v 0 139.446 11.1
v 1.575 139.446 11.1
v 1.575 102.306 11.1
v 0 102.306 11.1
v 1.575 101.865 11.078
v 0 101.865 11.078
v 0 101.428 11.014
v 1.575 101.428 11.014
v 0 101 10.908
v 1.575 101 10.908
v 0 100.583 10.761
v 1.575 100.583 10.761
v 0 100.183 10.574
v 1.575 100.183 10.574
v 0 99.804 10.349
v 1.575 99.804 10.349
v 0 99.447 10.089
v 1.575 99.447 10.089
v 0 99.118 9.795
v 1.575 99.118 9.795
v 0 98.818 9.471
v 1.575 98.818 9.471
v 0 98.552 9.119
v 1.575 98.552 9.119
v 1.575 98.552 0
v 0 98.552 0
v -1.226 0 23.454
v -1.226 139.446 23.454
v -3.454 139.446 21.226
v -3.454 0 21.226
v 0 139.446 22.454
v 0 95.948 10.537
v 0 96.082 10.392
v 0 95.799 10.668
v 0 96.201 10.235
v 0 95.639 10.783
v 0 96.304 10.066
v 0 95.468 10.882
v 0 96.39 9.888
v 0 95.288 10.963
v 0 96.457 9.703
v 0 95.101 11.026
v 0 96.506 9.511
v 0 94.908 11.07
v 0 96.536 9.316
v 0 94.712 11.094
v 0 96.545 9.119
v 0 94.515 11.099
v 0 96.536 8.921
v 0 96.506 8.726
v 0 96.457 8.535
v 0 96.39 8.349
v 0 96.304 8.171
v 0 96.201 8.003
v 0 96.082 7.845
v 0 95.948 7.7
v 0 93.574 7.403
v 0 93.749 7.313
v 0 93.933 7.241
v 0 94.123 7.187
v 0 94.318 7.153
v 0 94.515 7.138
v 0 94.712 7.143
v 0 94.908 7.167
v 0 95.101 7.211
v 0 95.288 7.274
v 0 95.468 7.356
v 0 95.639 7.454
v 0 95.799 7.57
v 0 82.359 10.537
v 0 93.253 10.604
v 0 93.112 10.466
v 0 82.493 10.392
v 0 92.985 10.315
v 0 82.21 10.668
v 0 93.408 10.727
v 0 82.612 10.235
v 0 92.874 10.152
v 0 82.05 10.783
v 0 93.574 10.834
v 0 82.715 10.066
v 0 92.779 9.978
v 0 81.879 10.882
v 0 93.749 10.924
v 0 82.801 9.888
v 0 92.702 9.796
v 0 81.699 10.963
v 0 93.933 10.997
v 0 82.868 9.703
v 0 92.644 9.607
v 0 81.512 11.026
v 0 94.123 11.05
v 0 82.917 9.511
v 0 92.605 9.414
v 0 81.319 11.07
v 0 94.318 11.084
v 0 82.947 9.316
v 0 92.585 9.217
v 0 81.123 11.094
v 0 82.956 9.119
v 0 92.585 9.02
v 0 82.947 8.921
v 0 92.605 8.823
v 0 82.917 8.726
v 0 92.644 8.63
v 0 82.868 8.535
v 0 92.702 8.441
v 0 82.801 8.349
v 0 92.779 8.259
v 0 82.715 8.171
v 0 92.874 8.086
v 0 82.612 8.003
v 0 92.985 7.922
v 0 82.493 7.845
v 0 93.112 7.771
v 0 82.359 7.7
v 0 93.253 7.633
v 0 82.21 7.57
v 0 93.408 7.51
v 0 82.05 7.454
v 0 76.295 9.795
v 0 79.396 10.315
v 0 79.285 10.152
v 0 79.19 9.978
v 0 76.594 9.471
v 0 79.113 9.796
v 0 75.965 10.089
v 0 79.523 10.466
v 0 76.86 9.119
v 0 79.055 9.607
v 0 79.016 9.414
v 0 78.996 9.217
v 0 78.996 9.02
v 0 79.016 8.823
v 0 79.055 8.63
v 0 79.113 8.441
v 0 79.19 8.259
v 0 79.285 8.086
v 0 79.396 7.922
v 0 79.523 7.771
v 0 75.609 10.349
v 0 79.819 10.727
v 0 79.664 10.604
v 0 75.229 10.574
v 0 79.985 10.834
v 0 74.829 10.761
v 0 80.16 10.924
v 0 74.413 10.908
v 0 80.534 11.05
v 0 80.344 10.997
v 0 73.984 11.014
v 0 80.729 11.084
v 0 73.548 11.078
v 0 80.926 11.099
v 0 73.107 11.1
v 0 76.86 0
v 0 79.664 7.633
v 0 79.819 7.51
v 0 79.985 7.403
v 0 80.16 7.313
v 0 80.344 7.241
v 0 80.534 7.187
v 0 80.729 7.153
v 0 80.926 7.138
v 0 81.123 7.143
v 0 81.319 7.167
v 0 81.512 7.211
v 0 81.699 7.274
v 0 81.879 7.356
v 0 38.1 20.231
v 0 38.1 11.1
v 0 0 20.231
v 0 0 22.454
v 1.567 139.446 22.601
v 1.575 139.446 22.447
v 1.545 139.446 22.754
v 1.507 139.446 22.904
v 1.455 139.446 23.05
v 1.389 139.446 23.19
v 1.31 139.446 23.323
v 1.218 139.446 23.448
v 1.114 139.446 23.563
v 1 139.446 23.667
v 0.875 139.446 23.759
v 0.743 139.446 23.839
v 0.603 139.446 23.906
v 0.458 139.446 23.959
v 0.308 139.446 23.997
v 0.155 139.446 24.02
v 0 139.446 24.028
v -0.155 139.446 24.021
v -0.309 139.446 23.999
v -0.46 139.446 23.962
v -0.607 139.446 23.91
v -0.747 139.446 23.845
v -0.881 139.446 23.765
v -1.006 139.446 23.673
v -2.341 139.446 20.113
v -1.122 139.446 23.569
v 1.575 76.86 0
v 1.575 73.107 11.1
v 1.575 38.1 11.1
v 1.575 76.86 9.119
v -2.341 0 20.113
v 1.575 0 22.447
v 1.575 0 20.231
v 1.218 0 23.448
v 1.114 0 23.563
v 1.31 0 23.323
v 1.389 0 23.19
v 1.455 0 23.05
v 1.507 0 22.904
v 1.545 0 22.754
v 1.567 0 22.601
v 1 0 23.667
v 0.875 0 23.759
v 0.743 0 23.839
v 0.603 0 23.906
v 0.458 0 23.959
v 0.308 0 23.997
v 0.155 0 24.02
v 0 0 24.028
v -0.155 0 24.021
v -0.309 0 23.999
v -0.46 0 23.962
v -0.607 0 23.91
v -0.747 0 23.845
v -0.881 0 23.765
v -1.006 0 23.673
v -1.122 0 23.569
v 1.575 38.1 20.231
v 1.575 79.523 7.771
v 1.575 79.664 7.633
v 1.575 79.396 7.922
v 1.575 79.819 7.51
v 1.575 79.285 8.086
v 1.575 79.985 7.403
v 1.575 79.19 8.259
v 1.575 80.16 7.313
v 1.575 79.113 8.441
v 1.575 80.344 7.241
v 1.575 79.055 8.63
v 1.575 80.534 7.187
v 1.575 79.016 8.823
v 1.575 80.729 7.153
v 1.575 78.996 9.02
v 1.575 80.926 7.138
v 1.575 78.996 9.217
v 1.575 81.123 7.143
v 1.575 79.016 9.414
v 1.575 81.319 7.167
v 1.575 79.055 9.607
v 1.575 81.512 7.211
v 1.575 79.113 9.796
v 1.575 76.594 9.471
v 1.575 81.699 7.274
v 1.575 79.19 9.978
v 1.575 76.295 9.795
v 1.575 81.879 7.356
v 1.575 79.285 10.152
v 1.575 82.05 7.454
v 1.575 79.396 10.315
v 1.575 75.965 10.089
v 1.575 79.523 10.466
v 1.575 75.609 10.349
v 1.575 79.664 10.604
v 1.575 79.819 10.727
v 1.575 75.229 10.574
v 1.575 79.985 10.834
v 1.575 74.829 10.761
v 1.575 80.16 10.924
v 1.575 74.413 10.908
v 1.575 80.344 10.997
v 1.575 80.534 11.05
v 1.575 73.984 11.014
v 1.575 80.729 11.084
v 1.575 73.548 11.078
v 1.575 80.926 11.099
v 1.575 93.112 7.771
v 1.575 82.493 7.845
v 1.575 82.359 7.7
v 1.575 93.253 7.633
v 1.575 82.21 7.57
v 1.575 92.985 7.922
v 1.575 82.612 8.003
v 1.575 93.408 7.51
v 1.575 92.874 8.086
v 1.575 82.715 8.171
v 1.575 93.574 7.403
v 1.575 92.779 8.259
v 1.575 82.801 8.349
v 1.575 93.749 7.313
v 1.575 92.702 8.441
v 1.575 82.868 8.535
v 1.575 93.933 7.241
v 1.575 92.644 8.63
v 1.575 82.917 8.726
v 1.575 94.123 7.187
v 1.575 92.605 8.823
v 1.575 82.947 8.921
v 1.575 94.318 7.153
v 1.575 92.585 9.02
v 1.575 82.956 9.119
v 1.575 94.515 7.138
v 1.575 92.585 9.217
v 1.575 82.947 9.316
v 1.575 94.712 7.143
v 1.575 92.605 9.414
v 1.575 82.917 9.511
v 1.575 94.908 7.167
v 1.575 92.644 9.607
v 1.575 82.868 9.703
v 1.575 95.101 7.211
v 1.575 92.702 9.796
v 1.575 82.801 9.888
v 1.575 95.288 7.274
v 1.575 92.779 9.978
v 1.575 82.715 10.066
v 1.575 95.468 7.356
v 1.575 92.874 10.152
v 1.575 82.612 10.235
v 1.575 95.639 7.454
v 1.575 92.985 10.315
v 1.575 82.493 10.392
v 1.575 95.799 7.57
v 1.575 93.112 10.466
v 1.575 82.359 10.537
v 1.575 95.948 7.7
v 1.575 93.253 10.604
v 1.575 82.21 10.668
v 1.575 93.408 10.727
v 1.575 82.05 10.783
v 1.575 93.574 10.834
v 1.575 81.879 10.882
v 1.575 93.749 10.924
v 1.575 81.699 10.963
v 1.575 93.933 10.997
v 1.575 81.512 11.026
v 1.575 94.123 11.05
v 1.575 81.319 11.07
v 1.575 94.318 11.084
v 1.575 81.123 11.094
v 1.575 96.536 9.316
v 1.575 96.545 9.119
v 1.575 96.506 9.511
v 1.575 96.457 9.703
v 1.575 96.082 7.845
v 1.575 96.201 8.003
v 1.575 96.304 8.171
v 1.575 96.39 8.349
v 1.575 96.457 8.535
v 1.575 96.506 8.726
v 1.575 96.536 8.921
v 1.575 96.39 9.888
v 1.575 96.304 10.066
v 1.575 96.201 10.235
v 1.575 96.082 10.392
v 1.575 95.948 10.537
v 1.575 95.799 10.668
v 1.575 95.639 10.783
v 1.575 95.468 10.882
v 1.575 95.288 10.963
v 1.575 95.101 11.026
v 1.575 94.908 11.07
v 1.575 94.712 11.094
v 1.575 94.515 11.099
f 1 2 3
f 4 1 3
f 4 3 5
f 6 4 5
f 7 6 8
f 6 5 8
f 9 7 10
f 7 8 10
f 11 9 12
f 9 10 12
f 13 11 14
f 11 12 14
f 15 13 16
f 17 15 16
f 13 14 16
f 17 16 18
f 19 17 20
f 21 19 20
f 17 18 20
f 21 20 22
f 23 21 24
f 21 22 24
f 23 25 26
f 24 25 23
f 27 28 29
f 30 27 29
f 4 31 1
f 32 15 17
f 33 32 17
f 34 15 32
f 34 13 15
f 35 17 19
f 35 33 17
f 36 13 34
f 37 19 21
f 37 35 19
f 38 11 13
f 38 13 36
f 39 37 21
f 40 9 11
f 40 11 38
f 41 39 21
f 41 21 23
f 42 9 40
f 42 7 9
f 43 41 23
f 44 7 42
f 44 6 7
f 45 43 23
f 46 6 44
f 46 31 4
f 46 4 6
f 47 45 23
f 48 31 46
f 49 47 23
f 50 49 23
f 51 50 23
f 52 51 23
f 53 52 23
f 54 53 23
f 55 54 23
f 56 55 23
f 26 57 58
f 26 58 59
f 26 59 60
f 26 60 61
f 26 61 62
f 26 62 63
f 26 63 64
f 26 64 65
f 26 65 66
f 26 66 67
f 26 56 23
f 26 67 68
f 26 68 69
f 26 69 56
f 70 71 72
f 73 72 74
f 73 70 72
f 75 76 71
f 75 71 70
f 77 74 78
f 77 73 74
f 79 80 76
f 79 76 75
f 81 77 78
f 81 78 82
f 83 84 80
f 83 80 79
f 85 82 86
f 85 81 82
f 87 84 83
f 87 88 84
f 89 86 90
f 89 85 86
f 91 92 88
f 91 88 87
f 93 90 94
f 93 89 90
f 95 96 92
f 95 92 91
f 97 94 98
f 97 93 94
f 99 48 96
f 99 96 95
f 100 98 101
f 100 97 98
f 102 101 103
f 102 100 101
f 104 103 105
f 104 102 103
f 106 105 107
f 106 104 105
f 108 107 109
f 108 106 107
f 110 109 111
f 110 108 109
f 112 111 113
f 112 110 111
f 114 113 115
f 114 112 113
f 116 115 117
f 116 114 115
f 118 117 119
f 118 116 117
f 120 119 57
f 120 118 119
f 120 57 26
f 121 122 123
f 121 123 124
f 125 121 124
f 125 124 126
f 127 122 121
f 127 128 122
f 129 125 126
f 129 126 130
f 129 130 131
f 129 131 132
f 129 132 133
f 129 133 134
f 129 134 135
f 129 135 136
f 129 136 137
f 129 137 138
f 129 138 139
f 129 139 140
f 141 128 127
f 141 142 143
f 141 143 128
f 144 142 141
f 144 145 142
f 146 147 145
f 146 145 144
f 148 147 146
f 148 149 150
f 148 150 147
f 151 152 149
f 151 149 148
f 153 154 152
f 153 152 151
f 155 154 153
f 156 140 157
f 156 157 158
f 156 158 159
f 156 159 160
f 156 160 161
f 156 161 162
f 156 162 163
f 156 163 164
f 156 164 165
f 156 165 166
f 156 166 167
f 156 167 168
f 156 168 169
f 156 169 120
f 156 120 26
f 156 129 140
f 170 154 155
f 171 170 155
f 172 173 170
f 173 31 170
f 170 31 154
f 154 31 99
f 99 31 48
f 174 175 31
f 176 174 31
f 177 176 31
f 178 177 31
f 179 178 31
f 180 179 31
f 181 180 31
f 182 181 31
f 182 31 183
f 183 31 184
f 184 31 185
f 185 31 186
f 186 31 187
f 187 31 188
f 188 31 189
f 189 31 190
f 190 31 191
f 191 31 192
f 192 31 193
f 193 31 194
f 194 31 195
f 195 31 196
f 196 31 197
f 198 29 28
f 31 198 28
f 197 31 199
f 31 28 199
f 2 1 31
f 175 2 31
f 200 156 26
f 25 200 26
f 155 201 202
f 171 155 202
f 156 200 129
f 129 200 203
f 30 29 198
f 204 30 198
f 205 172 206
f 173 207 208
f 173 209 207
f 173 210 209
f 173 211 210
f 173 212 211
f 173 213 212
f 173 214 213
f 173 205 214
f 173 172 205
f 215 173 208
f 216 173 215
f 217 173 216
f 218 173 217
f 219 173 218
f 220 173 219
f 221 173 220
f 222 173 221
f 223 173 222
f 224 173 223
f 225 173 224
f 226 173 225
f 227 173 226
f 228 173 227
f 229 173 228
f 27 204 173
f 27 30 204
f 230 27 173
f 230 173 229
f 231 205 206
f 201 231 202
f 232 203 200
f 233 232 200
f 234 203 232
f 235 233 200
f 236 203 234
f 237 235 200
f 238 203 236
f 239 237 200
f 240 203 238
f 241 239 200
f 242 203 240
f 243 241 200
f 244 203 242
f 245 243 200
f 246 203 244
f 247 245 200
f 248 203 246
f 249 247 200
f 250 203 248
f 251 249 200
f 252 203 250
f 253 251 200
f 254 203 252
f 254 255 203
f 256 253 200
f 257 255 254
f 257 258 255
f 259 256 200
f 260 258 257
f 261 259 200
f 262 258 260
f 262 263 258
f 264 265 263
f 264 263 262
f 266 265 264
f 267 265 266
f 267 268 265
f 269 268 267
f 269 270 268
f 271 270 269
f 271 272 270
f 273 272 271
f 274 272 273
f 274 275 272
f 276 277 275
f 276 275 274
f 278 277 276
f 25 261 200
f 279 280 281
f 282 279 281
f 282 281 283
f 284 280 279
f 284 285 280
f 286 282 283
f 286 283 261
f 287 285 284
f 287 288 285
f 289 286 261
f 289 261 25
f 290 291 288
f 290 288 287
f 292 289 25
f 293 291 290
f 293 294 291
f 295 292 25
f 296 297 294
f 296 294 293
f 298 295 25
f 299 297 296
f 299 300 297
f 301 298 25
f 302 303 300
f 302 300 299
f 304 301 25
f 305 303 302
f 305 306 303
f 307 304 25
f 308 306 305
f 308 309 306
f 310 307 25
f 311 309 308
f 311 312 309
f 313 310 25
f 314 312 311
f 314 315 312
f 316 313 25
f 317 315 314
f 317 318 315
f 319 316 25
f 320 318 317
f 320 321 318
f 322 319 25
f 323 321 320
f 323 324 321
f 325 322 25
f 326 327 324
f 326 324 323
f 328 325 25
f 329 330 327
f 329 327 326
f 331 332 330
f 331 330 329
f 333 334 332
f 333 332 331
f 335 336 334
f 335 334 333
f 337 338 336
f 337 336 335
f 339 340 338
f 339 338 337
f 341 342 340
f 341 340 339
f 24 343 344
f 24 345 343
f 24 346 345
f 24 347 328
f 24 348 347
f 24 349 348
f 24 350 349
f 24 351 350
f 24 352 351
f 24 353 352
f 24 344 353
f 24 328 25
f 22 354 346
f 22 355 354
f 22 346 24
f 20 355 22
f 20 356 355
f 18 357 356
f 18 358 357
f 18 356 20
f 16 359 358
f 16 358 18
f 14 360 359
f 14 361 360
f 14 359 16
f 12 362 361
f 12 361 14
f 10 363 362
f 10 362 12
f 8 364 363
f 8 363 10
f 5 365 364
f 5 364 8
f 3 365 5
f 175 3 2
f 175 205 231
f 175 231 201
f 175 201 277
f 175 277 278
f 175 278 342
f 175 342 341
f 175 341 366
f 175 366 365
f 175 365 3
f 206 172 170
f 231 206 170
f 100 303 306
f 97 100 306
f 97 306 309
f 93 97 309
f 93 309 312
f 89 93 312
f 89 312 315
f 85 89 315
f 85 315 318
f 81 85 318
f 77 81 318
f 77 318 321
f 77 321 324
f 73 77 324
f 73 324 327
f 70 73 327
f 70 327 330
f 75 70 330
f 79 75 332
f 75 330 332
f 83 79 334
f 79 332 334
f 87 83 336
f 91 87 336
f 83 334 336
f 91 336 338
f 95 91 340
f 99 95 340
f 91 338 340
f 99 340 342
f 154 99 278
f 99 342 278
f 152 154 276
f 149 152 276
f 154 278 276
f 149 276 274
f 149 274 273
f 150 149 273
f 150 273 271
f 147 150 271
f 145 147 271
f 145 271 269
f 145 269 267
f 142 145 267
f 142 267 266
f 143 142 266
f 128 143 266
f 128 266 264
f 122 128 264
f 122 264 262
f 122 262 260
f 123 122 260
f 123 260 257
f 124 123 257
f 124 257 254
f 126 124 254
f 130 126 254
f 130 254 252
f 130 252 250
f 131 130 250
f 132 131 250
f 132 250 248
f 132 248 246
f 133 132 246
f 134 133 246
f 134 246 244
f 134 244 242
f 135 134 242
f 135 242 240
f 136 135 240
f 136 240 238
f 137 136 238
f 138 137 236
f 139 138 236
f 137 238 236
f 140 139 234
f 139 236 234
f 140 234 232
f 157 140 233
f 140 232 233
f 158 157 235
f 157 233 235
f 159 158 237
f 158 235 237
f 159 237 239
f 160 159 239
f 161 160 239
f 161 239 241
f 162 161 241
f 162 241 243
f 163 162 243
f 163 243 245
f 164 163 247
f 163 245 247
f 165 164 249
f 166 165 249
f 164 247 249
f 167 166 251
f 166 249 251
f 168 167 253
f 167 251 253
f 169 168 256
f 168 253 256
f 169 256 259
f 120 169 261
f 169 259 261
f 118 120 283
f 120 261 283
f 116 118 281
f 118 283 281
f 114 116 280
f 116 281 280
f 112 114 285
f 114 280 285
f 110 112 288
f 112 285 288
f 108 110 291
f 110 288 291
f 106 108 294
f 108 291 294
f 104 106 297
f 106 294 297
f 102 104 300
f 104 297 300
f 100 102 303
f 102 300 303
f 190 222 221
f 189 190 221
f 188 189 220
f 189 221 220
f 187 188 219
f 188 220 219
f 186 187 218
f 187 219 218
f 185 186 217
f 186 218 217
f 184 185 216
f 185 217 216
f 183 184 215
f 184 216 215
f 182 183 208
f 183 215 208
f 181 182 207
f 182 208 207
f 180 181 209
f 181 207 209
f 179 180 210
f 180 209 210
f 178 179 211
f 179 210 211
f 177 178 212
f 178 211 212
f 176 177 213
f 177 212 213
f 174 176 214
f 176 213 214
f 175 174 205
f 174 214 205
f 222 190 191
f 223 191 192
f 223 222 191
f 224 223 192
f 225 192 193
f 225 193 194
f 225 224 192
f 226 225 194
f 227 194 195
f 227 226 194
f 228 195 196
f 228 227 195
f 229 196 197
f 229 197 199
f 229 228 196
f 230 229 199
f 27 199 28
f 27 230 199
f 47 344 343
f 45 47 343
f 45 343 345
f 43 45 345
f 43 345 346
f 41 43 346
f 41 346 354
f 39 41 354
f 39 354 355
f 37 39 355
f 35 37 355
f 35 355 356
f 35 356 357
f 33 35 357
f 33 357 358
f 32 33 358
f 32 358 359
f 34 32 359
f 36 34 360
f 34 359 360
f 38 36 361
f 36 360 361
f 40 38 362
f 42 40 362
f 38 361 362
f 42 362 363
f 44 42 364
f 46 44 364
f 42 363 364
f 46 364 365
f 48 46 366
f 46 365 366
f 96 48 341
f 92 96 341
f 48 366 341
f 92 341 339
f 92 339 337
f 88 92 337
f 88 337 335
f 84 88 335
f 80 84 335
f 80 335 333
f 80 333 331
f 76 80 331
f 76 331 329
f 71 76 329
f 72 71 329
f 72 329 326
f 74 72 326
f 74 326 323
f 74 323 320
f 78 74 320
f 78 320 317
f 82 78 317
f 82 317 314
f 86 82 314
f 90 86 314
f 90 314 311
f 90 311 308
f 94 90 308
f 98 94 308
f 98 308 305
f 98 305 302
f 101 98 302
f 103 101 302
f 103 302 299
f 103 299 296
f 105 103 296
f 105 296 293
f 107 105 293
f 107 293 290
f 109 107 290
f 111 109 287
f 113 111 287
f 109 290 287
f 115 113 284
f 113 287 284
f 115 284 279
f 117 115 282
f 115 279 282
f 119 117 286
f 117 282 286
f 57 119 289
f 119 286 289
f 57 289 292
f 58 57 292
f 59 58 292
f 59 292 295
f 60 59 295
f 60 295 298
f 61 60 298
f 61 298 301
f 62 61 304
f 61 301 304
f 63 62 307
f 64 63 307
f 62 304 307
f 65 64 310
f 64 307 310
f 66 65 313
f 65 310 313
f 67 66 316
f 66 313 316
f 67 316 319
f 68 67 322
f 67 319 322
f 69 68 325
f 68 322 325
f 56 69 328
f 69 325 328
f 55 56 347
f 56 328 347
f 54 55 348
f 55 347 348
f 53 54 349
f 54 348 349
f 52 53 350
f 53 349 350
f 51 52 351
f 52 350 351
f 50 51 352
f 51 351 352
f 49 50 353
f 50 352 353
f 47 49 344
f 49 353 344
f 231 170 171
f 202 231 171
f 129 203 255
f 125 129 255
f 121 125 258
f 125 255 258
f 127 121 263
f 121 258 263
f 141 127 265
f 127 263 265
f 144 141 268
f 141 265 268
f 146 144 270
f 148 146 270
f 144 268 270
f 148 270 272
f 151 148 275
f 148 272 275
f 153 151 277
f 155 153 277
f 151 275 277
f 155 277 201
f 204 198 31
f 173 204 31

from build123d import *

# Parameters (mm, degrees)
F0_W      = 139.446
F0_H      = 24.0284
F1_DEPTH  = 1.5748
F2_R      = 2.5273
F2_R_2    = 1.9812
F3_DEPTH  = 25.4
F4_W      = 76.8604
F4_H      = 9.1186
F4_W_2    = 40.894
F5_DEPTH  = 25.4
F7_DEPTH  = 25.4
F9_DEPTH  = 139.447
F10_DEPTH = 139.446
F11_R     = 2.5273
F12_DEPTH = 25.4
F14_DEPTH = 1.5748
F15_DEPTH = 25.4


# Not quite as in the source:
# - ends of sketch curves that miss each other by under 0.0002 mm in the source are joined


with BuildPart() as f1:
    # F0 (on Right) → F1 (new body)
    with BuildSketch(Plane.YZ):
        with Locations((69.723, 12.0142)):
            Rectangle(F0_W, F0_H)
    extrude(amount=F1_DEPTH)

    # F2 (on face) → F3 (cut)
    with BuildSketch(Plane.YZ.offset(1.5748)):
        with Locations((7.9502, 14.6812)):
            Circle(F2_R)
        with Locations((80.9752, 9.1186)):
            Circle(F2_R_2)
        with Locations((94.5642, 9.1186)):
            Circle(F2_R_2)
    extrude(amount=-F3_DEPTH, mode=Mode.SUBTRACT)

    # F4 (on face) → F5 (cut)
    with BuildSketch(Plane.YZ.offset(1.5748)):
        with Locations((38.4302, 4.5593)):
            Rectangle(F4_W, F4_H)
        with Locations((118.999, 4.5593)):
            Rectangle(F4_W_2, F4_H)
    extrude(amount=-F5_DEPTH, mode=Mode.SUBTRACT)

    # F6 (on face) → F7 (cut)
    with BuildSketch(Plane.YZ.offset(1.5748)):
        with BuildLine():
            ThreePointArc((102.3057040906, 11.0998), (104.4279345117, 10.5741090514), (106.0594081813, 9.1186))
            Line((106.0594081813, 9.1186), (139.446, 9.1186))
            Line((139.446, 9.1186), (139.446, 11.0998))
            Line((139.446, 11.0998), (102.3057040906, 11.0998))
        make_face()
        with BuildLine():
            Line((98.552, 9.1186), (106.0594081813, 9.1186))
            ThreePointArc((106.0594081813, 9.1186), (104.4279345117, 10.5741090514), (102.3057040906, 11.0998))
            ThreePointArc((102.3057040906, 11.0998), (100.1834736696, 10.5741090514), (98.552, 9.1186))
        make_face()
        with BuildLine():
            ThreePointArc((25.0643040906, 9.1186), (23.4328304559, 10.574109033), (21.3106000788, 11.0998))
            ThreePointArc((21.3106000788, 11.0998), (19.1883696138, 10.5741090698), (17.5568959094, 9.1186))
            Line((17.5568959094, 9.1186), (25.0643040906, 9.1186))
        make_face()
        with BuildLine():
            ThreePointArc((69.3529918187, 9.1186), (70.9844654883, 10.5741090514), (73.1066959094, 11.0998))
            Line((73.1066959094, 11.0998), (21.3106000788, 11.0998))
            ThreePointArc((21.3106000788, 11.0998), (23.4328304559, 10.574109033), (25.0643040906, 9.1186))
            Line((25.0643040906, 9.1186), (69.3529918187, 9.1186))
        make_face()
        with BuildLine():
            ThreePointArc((76.8604, 9.1186), (75.2289263304, 10.5741090514), (73.1066959094, 11.0998))
            ThreePointArc((73.1066959094, 11.0998), (70.9844654883, 10.5741090514), (69.3529918187, 9.1186))
            Line((69.3529918187, 9.1186), (76.8604, 9.1186))
        make_face()
    extrude(amount=-F7_DEPTH, mode=Mode.SUBTRACT)

    # F8 (on face) → F9 (cut, through all)
    with BuildSketch(Plane.XZ):
        with BuildLine():
            Line((1.5748, 24.0284), (0, 24.0284))
            ThreePointArc((0, 24.0284), (1.1139794542, 23.562560882), (1.5748, 22.4465026135))
            Line((1.5748, 22.4465026135), (1.5748, 24.0284))
        make_face()
    extrude(amount=-F9_DEPTH, mode=Mode.SUBTRACT)

    # F8 (on face) → F10 (join)
    with BuildSketch(Plane.XZ):
        with BuildLine():
            Line((0, 24.0284), (0, 22.4536))
            Line((0, 22.4536), (0, 22.4465026135))
            Line((0, 22.4465026135), (1.5748, 22.4465026135))
            ThreePointArc((1.5748, 22.4465026135), (1.1139794542, 23.562560882), (0, 24.0284))
        make_face()
        with BuildLine():
            Line((-1.2264893587, 23.4542141594), (-0.0070973865, 22.4465026135))
            Line((-0.0070973865, 22.4465026135), (0, 22.4536))
            Line((0, 22.4536), (0, 24.0284))
            ThreePointArc((0, 24.0284), (-0.6777928151, 23.8791808689), (-1.2264893587, 23.4542141594))
        make_face()
        Polygon((-3.4544, 21.226303518), (-2.340848241, 20.112751759), (-0.0070973865, 22.4465026135), (-1.2264893587, 23.4542141594), align=None)
    extrude(amount=-F10_DEPTH)

    # F11 (on face) → F12 (cut)
    with BuildSketch(Plane(origin=(0, 0, 0), x_dir=(0, -1, 0), z_dir=(-1, 0, 0))):
        with BuildLine():
            Line((-17.5568959094, 9.1186), (0, 9.1186))
            Line((0, 9.1186), (0, 20.2311))
            Line((0, 20.2311), (-38.1, 20.2311))
            Line((-38.1, 20.2311), (-38.1, 11.0998))
            Line((-38.1, 11.0998), (-21.3106000788, 11.0998))
            ThreePointArc((-21.3106000788, 11.0998), (-19.1883696138, 10.5741090698), (-17.5568959094, 9.1186))
        make_face()
        with Locations((-7.9502, 14.6812)):
            Circle(F11_R, mode=Mode.SUBTRACT)
    extrude(amount=-F12_DEPTH, mode=Mode.SUBTRACT)


with BuildPart() as f14:
    # F13 (on Right) → F14 (new body, through all)
    with BuildSketch(Plane.YZ):
        with BuildLine():
            Line((38.1, 20.2311), (0, 20.2311))
            Line((0, 20.2311), (0, 0))
            Line((0, 0), (16.764, 0))
            Line((16.764, 0), (16.764, 6.5532))
            ThreePointArc((16.764, 6.5532), (18.0956683087, 9.7681316913), (21.3106, 11.0998))
            Line((21.3106, 11.0998), (38.1, 11.0998))
            Line((38.1, 11.0998), (38.1, 20.2311))
        make_face()
    extrude(amount=F14_DEPTH)

    # F2 (on face) → F15 (cut)
    with BuildSketch(Plane.YZ.offset(1.5748)):
        with Locations((7.9502, 14.6812)):
            Circle(F2_R)
    extrude(amount=-F15_DEPTH, mode=Mode.SUBTRACT)


solid = f1.part
